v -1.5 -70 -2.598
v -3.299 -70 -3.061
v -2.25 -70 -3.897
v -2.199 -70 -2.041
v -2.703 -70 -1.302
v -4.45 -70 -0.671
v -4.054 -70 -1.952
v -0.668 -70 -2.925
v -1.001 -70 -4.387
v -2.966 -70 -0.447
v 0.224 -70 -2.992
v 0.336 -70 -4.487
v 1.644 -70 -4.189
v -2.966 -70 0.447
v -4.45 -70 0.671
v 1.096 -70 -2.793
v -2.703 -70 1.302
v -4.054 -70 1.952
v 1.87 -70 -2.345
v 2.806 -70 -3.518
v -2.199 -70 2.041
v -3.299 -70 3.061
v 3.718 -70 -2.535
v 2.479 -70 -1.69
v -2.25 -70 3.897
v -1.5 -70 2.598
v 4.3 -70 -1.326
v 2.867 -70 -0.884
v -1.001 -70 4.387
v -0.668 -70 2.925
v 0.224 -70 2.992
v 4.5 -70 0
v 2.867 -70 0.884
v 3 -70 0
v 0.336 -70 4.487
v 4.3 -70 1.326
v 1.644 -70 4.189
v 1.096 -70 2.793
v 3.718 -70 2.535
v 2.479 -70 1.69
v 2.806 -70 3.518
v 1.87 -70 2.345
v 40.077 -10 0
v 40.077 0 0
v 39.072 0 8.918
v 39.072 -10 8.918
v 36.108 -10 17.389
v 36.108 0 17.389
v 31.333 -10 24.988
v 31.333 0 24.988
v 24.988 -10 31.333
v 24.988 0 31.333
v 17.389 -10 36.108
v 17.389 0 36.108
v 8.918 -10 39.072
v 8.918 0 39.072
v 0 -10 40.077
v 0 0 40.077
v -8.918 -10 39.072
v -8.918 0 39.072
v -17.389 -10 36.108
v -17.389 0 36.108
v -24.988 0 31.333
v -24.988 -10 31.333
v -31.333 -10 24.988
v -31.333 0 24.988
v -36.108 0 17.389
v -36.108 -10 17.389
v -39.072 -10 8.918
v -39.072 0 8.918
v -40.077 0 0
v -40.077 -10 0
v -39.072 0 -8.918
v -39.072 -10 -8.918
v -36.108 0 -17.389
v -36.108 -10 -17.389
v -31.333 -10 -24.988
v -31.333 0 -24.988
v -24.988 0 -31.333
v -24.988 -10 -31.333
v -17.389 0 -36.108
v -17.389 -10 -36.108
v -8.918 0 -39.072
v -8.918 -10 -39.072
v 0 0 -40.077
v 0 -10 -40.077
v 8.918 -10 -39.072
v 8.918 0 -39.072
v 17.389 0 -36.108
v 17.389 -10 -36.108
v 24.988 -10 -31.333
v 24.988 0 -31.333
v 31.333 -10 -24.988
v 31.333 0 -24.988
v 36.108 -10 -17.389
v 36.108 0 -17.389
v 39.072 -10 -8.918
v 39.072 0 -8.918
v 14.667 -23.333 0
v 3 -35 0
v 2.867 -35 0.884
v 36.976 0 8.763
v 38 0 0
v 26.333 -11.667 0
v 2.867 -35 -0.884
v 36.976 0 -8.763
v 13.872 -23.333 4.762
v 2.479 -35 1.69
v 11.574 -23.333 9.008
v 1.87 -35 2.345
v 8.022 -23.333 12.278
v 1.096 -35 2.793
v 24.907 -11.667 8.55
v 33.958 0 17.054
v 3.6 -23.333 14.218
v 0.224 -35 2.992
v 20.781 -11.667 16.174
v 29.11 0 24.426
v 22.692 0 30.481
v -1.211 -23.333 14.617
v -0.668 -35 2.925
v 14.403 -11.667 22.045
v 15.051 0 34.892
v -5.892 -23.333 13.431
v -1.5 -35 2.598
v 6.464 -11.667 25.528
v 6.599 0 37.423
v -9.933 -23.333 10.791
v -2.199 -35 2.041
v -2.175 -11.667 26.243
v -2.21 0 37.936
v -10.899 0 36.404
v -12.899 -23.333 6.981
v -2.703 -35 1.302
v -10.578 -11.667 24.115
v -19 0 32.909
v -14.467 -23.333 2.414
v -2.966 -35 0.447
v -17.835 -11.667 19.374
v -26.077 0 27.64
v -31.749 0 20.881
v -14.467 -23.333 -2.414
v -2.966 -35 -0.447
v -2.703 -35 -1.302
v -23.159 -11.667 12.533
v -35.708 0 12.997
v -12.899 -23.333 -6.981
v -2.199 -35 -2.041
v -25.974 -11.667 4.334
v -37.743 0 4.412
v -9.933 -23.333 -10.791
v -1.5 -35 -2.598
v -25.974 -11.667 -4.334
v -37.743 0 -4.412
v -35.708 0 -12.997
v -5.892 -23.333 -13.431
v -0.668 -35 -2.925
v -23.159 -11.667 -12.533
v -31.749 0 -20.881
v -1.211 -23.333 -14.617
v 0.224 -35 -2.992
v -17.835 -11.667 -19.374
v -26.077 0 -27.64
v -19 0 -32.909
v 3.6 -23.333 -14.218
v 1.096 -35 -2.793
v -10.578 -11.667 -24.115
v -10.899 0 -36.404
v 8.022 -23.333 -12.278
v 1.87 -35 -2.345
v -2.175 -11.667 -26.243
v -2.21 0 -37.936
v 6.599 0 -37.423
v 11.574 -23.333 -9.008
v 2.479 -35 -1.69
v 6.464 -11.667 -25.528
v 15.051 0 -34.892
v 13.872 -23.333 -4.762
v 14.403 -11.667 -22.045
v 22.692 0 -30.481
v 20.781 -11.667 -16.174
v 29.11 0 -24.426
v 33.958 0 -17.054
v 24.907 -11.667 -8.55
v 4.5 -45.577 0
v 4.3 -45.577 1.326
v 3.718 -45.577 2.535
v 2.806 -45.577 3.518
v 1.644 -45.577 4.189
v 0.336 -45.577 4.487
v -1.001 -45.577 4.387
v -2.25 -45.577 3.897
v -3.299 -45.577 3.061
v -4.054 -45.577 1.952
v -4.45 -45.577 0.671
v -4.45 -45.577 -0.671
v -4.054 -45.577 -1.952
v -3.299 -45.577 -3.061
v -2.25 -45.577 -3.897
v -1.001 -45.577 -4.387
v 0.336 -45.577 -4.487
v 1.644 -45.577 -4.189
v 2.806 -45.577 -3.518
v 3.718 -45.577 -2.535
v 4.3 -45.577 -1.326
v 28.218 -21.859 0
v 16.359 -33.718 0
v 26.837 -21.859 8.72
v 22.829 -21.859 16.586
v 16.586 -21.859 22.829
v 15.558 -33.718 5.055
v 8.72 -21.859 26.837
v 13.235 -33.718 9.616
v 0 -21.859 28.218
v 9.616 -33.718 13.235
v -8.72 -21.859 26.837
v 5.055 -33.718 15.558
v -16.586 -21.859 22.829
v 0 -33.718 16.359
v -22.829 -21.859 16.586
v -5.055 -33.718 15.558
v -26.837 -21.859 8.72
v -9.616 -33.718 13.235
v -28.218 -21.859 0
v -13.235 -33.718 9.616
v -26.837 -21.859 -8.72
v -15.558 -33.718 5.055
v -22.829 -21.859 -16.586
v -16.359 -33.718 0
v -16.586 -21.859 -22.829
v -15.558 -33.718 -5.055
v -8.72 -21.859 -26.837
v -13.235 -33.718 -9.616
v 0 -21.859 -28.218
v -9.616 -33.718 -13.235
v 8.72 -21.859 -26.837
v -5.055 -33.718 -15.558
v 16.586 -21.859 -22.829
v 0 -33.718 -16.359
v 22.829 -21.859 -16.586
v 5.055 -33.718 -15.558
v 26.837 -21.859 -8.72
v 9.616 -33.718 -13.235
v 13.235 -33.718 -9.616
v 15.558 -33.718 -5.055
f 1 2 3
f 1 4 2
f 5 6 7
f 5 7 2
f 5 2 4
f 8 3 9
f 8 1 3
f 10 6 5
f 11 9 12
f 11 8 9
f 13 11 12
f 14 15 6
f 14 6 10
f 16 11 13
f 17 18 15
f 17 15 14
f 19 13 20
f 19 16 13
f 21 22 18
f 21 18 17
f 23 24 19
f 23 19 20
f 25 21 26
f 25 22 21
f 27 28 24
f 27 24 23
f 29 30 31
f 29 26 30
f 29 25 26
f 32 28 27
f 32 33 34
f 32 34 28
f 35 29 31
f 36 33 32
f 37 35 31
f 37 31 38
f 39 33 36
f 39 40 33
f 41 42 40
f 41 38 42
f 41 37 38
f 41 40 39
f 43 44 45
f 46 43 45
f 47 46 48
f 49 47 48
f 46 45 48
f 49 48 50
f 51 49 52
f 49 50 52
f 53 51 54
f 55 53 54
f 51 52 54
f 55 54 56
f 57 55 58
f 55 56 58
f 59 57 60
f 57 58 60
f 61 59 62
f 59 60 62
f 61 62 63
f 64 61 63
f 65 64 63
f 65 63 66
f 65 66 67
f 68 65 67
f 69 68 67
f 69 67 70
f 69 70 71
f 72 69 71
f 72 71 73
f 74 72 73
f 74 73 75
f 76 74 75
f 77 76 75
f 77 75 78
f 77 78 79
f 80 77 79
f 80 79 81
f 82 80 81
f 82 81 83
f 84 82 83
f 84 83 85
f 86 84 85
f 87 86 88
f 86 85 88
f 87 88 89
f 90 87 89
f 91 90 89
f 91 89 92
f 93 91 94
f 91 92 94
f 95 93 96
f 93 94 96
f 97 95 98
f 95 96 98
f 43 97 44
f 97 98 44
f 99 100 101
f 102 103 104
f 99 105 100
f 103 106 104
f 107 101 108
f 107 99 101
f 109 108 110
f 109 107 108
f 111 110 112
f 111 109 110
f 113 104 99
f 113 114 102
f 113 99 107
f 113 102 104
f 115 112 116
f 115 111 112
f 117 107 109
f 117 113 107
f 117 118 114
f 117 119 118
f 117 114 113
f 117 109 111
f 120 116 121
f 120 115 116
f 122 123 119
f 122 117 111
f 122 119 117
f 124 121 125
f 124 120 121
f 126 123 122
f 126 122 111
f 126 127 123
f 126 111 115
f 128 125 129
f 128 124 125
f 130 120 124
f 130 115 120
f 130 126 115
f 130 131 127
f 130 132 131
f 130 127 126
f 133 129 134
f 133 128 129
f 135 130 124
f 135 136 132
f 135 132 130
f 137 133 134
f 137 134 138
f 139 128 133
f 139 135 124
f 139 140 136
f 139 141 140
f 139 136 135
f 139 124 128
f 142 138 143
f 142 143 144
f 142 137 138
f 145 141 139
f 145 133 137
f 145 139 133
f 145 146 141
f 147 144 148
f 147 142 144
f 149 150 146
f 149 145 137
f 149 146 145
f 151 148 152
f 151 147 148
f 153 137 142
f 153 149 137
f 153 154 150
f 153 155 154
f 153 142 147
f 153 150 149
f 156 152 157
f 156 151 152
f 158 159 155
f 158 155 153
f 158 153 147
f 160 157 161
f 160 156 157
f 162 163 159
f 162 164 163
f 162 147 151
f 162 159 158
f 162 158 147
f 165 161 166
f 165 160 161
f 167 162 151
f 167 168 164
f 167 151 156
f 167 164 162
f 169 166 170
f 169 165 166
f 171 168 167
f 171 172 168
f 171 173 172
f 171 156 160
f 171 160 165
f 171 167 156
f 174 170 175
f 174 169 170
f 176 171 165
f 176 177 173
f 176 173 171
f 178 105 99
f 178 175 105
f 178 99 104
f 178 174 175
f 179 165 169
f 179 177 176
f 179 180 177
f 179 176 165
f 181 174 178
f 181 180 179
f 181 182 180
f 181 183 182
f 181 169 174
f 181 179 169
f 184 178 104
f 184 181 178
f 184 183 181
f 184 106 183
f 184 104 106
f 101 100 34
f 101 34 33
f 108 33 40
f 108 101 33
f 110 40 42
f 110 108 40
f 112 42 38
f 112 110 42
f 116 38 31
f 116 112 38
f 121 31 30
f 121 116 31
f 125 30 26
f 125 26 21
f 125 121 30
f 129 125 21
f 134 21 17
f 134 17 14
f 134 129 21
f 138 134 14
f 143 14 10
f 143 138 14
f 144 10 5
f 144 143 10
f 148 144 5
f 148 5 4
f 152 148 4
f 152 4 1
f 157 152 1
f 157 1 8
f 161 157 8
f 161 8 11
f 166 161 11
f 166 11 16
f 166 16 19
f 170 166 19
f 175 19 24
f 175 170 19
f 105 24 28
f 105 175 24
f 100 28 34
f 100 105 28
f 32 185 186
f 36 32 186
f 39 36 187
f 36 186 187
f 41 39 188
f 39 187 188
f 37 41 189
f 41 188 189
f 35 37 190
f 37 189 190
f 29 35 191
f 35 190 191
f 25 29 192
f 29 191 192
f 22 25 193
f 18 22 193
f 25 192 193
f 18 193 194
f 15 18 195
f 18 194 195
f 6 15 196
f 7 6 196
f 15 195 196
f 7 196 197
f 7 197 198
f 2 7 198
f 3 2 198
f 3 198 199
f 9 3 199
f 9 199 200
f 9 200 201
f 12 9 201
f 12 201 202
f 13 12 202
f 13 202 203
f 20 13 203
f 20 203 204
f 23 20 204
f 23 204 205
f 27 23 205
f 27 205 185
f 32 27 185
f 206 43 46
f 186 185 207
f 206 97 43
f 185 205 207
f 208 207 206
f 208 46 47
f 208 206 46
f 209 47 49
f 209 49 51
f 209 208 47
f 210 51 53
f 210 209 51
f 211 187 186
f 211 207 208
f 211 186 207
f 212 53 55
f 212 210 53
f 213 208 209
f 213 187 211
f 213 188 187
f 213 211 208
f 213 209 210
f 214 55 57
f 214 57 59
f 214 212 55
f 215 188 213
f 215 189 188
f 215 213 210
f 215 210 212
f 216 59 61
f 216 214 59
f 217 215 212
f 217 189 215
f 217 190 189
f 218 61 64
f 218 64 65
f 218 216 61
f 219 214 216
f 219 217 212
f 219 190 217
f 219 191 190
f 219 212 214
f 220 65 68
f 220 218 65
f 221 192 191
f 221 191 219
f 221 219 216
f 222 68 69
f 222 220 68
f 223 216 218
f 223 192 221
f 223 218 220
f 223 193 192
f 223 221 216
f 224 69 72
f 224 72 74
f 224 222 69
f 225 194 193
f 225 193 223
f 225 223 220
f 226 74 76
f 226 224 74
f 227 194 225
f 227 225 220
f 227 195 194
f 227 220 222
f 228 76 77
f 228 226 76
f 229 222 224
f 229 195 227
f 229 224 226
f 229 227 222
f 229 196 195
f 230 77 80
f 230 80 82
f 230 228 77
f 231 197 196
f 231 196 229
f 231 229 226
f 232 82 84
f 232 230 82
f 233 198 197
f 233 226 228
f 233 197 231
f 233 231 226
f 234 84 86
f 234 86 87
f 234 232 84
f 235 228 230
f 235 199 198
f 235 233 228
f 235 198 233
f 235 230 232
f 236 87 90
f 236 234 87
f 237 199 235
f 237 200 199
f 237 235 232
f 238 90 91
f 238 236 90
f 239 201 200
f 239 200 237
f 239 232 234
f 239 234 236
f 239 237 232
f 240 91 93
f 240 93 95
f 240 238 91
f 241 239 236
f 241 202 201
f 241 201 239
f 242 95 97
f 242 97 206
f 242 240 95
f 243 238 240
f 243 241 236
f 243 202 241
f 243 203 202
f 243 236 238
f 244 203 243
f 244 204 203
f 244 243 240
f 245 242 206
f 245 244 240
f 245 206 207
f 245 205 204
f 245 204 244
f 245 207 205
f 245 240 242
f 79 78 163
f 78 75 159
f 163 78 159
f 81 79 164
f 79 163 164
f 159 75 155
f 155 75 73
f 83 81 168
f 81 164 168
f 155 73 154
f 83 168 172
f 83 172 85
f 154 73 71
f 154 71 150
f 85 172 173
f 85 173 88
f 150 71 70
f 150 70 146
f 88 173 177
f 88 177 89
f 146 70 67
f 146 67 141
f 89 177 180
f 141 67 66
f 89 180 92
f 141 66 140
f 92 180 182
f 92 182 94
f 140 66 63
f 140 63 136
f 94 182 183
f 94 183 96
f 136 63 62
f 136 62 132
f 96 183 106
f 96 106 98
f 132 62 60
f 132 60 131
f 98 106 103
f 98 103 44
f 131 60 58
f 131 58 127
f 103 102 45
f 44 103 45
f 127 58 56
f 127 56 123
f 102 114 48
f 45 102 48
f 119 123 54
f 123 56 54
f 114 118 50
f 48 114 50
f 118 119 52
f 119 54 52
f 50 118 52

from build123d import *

# Parameters (mm, degrees)
F0_R     = 40.076976351
F0_R_2   = 4.5
F1_DEPTH = 50
F0_R_3   = 3
F3_DEPTH = 70
F4_SIZE  = 35


# Not quite as in the source:
# - a fillet or chamfer that OpenCascade refuses, or shapes differently, is made with other operations: its cross-section is extruded or revolved along the edge and cut away or added


with BuildPart() as f1:
    # F0 (on Front) → F1 (new body)
    with BuildSketch(Plane.XZ):
        Circle(F0_R)
        Circle(F0_R_2, mode=Mode.SUBTRACT)
    extrude(amount=F1_DEPTH)

    # F2: chamfer of 40 on 1 edges, made by hand

    # F2_s1 → F2_t2 (revolve, cut)
    with BuildSketch(Plane.XY):
        Polygon((40.076976351, -10), (0.076976351, -50), (40.076976351, -50), align=None)
    revolve(axis=Axis((0, -50, 0), (0, -1, 0)), mode=Mode.SUBTRACT)

    # F0 (on Front) → F3 (join)
    with BuildSketch(Plane.XZ):
        Circle(F0_R_2)
        Circle(F0_R_3, mode=Mode.SUBTRACT)
    extrude(amount=F3_DEPTH)

    # F4
    f4_edges = [f1.edges().sort_by_distance(p)[0] for p in [
        (-3, 0, 0),
    ]]
    chamfer(f4_edges, length=F4_SIZE)


solid = f1.part
